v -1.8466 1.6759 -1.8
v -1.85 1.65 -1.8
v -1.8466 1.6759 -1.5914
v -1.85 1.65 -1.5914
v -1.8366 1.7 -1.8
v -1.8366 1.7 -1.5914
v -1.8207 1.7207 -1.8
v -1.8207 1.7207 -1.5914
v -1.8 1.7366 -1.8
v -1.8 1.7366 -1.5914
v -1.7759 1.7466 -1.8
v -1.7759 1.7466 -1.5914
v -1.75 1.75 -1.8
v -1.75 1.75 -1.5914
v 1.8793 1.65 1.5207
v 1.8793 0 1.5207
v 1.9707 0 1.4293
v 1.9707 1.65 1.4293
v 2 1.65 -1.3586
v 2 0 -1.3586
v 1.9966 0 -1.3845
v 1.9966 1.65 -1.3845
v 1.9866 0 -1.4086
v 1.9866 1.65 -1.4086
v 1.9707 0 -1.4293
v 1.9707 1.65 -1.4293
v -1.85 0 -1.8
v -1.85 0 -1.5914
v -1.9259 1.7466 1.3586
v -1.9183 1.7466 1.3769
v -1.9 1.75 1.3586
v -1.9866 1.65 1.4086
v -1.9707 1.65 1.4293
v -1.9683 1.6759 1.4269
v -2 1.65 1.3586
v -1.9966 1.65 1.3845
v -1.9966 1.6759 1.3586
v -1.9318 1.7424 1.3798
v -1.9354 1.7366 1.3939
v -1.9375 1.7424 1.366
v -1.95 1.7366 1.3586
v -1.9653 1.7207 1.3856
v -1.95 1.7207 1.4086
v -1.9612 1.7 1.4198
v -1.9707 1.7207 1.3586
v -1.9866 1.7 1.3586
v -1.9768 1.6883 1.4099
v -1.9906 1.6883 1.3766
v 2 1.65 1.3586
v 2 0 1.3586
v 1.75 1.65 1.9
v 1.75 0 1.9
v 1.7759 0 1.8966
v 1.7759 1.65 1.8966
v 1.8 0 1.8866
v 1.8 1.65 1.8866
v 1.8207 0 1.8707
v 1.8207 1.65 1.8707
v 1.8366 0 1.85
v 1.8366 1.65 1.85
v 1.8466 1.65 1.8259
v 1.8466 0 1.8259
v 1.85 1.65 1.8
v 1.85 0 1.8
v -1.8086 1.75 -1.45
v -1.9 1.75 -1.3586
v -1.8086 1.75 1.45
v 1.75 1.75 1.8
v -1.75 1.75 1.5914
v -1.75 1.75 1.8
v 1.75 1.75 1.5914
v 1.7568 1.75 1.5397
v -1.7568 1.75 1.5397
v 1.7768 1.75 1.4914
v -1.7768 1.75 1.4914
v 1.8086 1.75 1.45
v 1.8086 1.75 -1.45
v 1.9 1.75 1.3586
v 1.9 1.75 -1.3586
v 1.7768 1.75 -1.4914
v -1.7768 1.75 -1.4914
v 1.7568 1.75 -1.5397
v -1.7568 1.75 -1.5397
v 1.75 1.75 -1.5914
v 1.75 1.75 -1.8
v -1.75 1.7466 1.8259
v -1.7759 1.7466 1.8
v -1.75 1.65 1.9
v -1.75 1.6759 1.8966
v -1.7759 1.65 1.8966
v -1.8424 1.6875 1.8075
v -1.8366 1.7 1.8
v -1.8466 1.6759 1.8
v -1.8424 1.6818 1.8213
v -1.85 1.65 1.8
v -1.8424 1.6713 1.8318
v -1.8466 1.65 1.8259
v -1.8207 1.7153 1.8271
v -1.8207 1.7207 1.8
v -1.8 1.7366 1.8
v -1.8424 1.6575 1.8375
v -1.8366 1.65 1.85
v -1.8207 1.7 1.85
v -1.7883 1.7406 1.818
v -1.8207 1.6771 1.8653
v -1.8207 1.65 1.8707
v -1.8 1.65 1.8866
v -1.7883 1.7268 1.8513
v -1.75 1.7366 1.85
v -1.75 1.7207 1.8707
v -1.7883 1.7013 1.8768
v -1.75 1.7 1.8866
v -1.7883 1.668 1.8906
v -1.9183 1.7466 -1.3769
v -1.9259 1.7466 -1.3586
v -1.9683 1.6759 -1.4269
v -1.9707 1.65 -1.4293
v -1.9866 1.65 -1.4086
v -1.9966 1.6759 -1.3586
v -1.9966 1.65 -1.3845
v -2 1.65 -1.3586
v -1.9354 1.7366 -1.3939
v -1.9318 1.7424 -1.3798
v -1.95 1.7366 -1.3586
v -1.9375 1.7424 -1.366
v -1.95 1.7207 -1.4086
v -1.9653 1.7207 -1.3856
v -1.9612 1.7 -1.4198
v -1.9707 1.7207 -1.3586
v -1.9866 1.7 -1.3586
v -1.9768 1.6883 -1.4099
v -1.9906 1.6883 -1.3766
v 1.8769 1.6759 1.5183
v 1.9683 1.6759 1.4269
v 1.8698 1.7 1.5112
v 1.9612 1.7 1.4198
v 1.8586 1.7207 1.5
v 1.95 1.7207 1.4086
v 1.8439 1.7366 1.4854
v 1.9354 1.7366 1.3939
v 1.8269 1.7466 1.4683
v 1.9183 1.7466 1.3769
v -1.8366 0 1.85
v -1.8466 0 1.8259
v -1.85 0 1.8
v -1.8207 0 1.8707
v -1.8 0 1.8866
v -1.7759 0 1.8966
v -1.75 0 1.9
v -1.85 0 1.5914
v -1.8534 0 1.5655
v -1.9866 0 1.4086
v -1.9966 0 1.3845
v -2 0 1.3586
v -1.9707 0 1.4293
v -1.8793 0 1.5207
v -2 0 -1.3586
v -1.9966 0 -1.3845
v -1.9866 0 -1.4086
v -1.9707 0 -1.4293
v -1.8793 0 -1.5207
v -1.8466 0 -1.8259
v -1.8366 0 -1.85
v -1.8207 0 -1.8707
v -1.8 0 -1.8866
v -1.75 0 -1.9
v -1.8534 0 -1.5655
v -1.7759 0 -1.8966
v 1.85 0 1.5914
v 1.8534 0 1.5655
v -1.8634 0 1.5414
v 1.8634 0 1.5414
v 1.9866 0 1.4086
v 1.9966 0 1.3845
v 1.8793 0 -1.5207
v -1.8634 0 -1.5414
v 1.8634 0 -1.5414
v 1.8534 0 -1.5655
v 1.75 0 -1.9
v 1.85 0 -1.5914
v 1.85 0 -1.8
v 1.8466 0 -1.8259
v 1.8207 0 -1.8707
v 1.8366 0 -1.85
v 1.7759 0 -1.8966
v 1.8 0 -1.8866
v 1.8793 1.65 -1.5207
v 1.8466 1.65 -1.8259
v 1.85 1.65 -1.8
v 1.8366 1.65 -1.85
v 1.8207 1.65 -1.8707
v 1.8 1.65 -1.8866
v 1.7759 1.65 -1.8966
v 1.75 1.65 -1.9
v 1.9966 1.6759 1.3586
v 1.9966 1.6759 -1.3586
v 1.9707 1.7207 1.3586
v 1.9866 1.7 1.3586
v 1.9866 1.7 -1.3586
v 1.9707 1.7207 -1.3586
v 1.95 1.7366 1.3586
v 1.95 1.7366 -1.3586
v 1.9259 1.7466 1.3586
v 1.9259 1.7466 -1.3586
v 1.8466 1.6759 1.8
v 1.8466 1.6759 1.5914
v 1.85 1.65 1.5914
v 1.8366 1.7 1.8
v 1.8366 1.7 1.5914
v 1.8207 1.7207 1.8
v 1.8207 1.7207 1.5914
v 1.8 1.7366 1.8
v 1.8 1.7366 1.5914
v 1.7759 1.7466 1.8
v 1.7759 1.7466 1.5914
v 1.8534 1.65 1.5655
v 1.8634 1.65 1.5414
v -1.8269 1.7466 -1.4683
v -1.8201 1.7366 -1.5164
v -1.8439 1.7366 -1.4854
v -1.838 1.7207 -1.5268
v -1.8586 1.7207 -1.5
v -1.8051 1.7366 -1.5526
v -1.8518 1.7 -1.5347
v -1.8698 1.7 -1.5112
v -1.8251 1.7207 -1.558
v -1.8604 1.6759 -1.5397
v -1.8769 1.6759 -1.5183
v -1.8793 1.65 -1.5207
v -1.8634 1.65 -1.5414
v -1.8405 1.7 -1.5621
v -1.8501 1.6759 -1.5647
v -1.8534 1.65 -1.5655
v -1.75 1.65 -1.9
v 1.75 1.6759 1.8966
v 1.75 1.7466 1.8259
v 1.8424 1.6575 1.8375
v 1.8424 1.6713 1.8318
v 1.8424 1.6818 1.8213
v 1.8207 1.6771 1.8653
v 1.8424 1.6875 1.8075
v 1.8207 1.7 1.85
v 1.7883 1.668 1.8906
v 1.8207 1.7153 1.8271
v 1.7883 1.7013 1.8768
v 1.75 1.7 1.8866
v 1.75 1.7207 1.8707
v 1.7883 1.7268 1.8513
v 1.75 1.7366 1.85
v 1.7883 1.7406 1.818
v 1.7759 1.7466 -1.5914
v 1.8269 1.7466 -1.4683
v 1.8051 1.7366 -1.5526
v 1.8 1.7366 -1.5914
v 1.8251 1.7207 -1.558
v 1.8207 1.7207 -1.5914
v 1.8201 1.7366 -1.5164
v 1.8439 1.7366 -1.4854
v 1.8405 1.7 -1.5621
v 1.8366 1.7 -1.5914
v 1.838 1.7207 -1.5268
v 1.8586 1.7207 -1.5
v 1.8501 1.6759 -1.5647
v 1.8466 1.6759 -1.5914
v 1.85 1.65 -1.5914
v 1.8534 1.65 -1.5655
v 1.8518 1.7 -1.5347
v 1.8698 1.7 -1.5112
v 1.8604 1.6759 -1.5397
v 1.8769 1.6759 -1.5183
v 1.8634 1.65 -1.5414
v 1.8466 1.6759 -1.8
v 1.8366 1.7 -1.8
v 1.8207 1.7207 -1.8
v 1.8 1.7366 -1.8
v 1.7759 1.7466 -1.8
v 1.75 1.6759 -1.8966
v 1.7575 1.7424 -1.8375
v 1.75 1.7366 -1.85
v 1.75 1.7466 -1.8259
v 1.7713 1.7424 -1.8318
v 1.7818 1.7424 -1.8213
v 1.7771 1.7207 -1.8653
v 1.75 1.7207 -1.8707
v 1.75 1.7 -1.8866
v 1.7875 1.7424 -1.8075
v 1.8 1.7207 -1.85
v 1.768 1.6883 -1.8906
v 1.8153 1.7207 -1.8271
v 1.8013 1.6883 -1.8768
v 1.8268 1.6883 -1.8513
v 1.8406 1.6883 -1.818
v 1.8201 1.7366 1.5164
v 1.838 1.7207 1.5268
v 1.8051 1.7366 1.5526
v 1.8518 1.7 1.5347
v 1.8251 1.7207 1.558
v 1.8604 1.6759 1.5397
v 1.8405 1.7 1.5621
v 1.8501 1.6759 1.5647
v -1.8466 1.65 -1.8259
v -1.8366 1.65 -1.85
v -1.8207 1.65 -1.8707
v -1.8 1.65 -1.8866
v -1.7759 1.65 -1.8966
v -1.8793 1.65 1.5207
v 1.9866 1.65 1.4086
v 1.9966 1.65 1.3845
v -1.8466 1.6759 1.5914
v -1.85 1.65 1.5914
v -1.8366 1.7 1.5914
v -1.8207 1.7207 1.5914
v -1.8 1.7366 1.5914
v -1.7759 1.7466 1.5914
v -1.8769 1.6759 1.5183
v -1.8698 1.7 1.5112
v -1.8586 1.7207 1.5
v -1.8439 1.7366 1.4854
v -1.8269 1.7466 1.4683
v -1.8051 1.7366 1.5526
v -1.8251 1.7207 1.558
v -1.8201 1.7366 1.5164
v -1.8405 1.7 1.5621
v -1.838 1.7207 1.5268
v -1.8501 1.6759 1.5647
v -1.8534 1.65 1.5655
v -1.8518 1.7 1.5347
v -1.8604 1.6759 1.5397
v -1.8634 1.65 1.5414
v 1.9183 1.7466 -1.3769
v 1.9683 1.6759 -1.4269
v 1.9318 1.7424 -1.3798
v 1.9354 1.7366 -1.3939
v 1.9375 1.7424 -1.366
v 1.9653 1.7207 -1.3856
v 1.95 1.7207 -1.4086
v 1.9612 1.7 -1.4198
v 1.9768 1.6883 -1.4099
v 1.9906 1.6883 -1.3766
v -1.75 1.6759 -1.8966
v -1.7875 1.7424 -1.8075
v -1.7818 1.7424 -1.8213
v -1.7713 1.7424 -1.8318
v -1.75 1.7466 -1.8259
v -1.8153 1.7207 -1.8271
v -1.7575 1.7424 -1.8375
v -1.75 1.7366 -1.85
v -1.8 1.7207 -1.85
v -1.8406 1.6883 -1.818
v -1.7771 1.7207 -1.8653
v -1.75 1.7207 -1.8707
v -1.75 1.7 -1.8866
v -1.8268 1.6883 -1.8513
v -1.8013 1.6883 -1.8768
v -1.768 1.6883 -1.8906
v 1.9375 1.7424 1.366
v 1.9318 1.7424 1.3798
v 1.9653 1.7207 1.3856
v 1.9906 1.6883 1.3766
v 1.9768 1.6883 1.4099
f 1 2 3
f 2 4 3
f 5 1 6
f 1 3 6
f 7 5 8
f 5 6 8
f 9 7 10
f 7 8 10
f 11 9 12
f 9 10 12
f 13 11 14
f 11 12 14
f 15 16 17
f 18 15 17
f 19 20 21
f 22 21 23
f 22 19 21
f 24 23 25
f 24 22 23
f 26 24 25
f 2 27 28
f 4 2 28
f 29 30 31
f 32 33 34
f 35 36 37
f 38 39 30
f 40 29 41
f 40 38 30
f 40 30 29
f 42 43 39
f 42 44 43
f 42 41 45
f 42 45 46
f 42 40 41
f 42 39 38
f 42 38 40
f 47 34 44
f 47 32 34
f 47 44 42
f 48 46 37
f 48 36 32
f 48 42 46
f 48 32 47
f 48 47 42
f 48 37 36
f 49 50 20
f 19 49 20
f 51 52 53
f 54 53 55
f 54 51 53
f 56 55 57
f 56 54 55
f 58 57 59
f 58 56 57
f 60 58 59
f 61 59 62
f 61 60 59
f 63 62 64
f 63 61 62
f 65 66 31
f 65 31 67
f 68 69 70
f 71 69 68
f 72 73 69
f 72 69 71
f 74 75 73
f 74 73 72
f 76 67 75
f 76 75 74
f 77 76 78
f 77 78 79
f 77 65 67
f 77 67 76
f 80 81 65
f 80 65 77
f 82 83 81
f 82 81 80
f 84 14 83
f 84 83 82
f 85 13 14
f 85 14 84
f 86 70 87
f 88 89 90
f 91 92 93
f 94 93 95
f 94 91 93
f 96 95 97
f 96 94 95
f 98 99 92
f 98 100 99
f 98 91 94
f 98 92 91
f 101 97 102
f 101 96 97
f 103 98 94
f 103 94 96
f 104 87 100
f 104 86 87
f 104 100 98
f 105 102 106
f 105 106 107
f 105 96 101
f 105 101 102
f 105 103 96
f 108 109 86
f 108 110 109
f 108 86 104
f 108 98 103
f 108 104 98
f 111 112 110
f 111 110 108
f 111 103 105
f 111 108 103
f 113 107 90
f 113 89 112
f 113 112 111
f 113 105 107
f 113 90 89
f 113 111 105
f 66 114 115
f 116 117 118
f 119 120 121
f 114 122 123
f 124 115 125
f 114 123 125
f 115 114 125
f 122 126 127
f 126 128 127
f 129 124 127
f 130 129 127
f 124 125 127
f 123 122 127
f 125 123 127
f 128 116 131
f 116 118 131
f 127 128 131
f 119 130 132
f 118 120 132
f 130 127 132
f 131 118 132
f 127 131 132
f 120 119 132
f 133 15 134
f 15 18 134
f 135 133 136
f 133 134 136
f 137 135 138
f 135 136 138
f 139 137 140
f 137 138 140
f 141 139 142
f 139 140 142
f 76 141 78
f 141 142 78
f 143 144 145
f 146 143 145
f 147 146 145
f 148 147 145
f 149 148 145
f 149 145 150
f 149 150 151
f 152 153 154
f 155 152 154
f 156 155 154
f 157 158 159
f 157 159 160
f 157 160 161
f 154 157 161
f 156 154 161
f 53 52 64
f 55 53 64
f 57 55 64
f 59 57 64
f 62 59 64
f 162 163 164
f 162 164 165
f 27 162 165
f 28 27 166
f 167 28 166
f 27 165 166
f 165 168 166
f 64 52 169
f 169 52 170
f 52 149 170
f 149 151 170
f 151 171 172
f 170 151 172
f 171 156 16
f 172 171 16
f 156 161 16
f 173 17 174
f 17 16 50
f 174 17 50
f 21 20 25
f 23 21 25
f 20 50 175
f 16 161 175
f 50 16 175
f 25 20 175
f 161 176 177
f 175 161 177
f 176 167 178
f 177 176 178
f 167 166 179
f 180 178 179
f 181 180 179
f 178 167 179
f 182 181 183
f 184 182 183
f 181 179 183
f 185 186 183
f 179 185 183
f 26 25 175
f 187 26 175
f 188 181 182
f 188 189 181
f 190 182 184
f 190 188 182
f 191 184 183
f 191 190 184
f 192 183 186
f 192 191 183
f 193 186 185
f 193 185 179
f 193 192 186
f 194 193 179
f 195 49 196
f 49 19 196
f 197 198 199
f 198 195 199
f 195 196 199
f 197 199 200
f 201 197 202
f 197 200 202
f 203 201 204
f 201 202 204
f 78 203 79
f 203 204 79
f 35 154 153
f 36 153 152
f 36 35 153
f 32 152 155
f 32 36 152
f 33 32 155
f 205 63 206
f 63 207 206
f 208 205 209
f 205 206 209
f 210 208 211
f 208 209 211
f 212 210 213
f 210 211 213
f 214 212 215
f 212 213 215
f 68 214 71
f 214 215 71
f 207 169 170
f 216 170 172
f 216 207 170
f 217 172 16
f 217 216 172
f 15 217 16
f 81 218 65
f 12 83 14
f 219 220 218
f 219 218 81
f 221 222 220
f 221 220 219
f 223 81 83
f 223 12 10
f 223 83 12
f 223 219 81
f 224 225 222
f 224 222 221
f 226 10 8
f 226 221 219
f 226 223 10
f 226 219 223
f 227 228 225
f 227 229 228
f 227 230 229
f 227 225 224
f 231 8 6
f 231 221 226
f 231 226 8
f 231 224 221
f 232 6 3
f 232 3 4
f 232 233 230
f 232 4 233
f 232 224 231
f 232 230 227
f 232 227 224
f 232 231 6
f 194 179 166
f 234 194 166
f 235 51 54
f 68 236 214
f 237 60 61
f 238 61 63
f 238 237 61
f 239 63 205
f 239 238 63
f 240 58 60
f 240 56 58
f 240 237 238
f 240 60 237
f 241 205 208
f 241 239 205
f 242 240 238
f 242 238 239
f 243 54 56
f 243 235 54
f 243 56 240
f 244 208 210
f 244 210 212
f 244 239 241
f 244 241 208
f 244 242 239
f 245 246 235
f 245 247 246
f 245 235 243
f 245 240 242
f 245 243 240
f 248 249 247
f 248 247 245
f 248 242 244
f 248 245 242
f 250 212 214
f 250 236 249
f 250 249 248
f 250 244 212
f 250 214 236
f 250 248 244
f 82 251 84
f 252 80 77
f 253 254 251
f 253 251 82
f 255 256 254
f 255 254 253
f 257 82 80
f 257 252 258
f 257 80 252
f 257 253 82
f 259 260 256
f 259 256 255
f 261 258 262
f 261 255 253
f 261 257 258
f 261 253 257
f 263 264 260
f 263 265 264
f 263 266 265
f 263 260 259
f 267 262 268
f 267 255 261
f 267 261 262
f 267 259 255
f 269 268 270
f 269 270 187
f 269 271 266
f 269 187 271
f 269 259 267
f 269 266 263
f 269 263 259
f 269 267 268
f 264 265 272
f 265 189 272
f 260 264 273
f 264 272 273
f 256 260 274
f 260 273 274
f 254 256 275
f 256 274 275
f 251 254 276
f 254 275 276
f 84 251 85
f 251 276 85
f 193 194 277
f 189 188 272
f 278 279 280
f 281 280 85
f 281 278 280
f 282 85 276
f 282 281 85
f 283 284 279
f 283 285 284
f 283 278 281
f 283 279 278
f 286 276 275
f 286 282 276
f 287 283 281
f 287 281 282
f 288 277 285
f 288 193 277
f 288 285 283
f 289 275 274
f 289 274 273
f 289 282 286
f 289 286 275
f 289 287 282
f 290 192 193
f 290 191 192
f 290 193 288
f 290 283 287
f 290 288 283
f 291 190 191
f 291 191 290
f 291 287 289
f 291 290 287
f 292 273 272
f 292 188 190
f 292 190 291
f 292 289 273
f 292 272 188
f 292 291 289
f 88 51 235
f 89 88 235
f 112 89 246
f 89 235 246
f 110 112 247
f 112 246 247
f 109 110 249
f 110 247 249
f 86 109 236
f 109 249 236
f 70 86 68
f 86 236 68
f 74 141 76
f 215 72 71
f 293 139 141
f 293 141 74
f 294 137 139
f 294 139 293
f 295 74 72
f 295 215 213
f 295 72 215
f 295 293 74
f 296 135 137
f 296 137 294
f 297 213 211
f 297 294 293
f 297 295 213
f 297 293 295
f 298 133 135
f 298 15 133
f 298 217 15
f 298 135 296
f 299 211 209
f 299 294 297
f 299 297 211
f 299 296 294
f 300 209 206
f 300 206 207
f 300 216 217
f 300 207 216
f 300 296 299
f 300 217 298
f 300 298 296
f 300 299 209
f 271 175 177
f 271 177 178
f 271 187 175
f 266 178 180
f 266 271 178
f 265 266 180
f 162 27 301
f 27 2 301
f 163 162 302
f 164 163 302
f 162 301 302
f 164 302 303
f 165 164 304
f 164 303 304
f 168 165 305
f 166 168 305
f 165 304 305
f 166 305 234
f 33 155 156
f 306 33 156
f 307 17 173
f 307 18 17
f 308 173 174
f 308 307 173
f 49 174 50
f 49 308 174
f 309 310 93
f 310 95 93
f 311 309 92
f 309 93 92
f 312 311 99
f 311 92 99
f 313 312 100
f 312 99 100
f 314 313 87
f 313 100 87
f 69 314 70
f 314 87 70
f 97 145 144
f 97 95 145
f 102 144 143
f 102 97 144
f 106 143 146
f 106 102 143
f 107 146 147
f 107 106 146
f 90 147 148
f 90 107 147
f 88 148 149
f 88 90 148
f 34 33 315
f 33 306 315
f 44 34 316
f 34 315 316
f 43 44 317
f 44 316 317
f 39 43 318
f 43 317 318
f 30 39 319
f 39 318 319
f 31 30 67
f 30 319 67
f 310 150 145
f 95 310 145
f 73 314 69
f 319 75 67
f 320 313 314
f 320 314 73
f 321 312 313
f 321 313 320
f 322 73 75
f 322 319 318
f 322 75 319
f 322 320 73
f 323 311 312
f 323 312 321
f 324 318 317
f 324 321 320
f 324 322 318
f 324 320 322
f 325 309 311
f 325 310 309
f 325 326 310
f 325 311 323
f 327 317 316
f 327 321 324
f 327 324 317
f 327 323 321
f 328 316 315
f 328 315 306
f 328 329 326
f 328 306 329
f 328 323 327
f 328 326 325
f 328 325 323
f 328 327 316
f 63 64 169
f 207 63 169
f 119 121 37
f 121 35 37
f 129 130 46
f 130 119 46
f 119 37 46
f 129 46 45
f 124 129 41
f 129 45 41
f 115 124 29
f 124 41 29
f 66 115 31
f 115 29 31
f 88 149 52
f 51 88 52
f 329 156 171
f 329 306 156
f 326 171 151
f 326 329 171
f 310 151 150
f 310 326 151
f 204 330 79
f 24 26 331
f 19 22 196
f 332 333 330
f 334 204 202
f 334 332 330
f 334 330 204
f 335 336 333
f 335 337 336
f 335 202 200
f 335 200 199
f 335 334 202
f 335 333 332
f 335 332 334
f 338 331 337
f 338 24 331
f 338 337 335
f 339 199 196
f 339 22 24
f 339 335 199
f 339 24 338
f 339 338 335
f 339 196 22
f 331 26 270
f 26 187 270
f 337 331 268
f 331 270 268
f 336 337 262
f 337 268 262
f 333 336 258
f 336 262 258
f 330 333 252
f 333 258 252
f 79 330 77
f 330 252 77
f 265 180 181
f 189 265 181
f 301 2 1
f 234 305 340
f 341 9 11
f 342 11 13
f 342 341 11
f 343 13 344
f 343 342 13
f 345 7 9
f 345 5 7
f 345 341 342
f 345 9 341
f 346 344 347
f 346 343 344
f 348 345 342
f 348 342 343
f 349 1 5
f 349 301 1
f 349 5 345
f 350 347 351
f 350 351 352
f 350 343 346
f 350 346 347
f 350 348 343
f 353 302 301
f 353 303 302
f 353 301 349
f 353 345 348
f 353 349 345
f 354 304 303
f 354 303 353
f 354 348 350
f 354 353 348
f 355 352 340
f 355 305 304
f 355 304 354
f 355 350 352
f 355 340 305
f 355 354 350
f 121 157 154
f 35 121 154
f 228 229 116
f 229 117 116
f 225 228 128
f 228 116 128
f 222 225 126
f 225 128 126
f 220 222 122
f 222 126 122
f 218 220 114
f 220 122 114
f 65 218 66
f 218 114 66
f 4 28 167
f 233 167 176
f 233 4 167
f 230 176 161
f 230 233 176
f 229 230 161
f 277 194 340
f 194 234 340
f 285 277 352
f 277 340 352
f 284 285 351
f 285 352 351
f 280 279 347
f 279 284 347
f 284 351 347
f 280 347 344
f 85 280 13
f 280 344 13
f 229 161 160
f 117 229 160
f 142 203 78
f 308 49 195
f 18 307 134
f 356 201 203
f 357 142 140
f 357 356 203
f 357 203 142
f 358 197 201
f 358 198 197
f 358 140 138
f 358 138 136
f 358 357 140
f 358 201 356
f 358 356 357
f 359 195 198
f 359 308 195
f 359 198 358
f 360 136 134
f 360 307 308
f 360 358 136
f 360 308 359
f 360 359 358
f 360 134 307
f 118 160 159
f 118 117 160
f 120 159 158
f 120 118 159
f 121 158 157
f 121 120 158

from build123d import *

# Parameters (mm, degrees)
EXTRUDE_2_DEPTH = 1.75
FILLET_1_R      = 0.1


with BuildPart() as part:
    # Эскиз1 → Бобышка-Вытянуть2 (new body)
    with BuildSketch(Plane(origin=(0, 0, 0), x_dir=(1, 0, 0), z_dir=(0, 1, 0))):
        Polygon((-1.85, 1.9), (-1.85, 1.55), (-2, 1.4), (-2, -1.4), (-1.85, -1.55), (-1.85, -1.9), (1.85, -1.9), (1.85, -1.55), (2, -1.4), (2, 1.4), (1.85, 1.55), (1.85, 1.9), align=None)
    extrude(amount=EXTRUDE_2_DEPTH)

    # Скругление1
    fillet_1_edges = [part.edges().sort_by_distance(p)[0] for p in [
        (0, 1.75, 1.9),
        (-1.85, 1.75, 1.725),
        (-1.925, 1.75, 1.475),
        (-2, 1.75, 0),
        (2, 0.875, 1.4),
        (2, 0.875, -1.4),
        (1.85, 0.875, -1.55),
        (1.85, 0.875, -1.9),
        (-1.85, 0.875, -1.9),
        (-1.85, 0.875, -1.55),
        (-2, 0.875, -1.4),
        (-2, 0.875, 1.4),
        (-1.85, 0.875, 1.55),
        (-1.85, 0.875, 1.9),
        (1.85, 0.875, 1.9),
        (1.85, 0.875, 1.55),
        (-1.925, 1.75, -1.475),
        (-1.85, 1.75, -1.725),
        (0, 1.75, -1.9),
        (1.85, 1.75, -1.725),
        (1.925, 1.75, -1.475),
        (2, 1.75, 0),
        (1.925, 1.75, 1.475),
        (1.85, 1.75, 1.725),
    ]]
    fillet(fillet_1_edges, radius=FILLET_1_R)


solid = part.part
